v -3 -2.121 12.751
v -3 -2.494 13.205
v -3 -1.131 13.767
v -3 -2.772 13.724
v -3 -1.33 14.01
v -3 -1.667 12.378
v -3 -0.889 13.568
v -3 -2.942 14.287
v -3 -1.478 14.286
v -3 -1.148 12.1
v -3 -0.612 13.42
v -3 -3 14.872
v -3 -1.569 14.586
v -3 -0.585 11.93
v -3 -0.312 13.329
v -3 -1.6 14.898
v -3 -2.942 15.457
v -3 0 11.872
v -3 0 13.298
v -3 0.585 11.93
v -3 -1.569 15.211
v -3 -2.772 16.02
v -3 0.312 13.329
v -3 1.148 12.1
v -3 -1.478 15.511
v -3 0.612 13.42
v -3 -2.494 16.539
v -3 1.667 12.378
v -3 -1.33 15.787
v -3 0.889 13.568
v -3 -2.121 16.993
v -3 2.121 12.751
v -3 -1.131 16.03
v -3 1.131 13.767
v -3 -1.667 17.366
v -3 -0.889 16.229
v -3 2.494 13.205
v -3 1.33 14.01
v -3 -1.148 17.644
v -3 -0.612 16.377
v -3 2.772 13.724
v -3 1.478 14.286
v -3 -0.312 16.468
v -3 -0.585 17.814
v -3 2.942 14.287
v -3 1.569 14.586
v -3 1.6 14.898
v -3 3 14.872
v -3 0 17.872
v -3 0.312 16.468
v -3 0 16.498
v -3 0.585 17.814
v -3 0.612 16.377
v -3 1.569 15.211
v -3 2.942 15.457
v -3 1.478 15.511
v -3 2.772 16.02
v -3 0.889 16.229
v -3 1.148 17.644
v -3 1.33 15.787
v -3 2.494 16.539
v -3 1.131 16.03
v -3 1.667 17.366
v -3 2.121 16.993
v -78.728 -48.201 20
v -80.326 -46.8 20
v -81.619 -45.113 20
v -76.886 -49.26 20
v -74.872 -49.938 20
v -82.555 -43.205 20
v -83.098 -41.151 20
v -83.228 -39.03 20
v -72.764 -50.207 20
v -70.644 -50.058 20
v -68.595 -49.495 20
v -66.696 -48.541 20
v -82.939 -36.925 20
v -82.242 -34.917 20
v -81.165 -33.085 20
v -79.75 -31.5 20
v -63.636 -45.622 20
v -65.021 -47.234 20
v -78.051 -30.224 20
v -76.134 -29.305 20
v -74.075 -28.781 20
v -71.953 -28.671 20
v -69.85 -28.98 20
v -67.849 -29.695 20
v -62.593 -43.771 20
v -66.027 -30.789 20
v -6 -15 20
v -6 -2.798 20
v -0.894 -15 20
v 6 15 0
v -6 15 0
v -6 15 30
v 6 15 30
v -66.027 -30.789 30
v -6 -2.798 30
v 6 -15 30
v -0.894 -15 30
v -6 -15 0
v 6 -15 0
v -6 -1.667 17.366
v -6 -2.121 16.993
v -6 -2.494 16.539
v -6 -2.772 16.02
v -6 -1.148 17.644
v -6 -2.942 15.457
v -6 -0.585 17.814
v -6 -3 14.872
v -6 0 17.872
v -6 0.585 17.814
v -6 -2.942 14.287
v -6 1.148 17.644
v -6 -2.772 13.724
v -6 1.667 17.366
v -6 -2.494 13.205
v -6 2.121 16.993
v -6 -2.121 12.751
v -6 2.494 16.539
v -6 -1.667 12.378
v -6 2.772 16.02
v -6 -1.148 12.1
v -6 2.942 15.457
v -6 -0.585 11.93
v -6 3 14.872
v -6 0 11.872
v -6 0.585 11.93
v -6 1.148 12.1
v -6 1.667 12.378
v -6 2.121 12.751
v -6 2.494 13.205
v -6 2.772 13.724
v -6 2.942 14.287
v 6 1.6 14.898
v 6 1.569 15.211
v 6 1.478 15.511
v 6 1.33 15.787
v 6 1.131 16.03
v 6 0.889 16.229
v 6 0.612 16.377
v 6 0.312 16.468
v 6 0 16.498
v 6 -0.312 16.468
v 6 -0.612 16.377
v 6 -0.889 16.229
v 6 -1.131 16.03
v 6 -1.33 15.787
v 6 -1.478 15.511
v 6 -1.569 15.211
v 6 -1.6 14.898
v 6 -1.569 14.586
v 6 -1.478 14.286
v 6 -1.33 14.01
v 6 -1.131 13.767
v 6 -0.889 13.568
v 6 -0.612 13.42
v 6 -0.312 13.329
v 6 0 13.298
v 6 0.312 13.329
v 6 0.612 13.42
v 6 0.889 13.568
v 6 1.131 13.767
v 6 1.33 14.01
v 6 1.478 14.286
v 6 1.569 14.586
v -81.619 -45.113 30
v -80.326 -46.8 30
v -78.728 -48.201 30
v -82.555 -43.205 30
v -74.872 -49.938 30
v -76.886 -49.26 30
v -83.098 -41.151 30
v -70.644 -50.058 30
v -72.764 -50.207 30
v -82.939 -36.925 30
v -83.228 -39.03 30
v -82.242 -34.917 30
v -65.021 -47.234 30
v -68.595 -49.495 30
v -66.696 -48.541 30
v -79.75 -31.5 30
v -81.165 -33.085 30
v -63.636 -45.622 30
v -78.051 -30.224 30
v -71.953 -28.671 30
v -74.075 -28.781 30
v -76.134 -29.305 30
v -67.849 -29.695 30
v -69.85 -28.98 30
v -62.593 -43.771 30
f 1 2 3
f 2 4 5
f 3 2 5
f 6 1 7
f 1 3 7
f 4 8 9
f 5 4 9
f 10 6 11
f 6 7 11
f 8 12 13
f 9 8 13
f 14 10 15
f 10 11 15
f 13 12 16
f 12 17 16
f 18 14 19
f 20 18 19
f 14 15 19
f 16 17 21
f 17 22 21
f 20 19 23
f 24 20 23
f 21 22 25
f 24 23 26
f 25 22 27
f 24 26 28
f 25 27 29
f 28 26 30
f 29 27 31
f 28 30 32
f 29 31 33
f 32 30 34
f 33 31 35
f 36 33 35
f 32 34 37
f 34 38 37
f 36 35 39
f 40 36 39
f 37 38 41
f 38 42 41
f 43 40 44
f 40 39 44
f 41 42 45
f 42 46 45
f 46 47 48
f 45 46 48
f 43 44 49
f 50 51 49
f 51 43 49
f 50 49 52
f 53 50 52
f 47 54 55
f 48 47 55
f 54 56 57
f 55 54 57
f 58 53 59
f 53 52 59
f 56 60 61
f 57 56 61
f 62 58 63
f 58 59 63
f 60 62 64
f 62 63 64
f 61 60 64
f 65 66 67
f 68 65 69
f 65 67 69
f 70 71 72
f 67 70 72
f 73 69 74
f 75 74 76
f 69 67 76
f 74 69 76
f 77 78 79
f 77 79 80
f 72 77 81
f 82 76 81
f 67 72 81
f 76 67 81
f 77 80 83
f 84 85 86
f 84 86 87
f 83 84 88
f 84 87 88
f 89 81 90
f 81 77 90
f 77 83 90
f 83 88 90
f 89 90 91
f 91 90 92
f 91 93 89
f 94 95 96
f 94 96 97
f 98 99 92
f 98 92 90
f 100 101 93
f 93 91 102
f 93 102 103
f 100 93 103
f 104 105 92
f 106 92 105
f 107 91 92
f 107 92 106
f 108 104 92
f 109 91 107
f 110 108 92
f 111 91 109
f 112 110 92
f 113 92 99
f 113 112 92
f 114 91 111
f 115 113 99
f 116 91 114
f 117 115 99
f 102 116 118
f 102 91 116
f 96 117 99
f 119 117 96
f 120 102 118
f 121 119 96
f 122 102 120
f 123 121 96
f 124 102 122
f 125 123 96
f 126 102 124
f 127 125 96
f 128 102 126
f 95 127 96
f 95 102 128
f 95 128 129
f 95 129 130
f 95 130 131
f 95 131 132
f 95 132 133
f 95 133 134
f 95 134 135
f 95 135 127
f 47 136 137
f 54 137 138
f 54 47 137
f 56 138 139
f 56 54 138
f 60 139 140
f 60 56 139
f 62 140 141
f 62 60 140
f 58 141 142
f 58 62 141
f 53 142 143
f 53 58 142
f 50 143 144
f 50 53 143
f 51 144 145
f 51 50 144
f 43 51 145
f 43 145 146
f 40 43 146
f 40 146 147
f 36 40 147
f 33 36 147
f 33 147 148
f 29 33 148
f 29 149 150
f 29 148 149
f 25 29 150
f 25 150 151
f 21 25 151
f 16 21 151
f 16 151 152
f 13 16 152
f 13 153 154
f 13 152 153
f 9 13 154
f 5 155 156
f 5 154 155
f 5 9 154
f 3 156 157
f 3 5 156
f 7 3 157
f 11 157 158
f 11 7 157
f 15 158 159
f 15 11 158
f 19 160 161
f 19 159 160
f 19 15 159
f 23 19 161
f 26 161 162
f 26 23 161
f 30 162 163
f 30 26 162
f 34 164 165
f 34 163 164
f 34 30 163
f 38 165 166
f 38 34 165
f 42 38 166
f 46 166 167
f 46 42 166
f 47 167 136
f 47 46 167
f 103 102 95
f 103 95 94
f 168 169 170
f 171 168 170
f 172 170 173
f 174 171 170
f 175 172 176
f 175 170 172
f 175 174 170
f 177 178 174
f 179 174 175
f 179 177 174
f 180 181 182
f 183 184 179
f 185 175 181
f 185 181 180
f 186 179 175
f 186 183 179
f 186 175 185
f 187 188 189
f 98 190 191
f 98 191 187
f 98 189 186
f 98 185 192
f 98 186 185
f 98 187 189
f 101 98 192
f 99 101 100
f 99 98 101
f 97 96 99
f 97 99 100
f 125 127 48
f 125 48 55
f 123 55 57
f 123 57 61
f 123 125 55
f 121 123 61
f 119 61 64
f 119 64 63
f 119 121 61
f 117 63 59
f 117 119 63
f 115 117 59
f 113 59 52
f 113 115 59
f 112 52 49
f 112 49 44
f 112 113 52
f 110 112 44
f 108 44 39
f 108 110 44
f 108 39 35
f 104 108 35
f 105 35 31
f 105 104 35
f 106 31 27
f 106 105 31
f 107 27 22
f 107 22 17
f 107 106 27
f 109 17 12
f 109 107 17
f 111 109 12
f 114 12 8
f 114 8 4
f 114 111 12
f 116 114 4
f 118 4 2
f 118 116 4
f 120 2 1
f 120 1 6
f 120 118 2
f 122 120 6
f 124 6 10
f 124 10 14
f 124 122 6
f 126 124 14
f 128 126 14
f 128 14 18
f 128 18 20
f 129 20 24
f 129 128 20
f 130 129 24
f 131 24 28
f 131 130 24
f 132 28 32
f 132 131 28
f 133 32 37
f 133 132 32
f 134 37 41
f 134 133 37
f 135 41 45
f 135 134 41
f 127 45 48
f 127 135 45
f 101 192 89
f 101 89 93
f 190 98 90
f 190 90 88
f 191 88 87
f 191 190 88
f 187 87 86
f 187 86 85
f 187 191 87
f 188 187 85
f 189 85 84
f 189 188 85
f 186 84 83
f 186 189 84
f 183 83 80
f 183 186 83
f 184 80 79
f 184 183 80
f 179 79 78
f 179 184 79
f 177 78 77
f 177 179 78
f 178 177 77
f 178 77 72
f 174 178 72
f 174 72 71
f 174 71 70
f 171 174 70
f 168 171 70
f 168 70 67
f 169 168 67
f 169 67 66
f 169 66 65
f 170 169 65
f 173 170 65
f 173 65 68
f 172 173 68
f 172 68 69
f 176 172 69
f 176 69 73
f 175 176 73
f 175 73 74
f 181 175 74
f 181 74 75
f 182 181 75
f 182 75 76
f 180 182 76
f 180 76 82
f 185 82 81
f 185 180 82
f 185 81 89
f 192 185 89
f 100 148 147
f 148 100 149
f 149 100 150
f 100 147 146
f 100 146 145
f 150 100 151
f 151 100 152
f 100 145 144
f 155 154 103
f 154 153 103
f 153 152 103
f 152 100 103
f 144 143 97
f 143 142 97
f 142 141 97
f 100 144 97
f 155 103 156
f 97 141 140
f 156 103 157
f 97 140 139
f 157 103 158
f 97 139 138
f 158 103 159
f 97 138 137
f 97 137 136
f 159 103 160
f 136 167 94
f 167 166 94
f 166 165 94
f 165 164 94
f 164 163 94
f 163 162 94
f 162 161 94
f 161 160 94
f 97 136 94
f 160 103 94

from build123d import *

# Parameters (mm, degrees)
SKETCH_W        = 12
SKETCH_H        = 30
PAD_DEPTH       = 30
PAD001_DEPTH    = 10
SKETCH002_R     = 10.776267
PAD002_DEPTH    = 10
SKETCH004_R     = 3
POCKET001_DEPTH = 3
SKETCH005_R     = 1.6
POCKET_DEPTH    = 9.001


with BuildPart() as part:
    # Sketch → Pad (new body)
    with BuildSketch(Plane.XY):
        Rectangle(SKETCH_W, SKETCH_H)
    extrude(amount=PAD_DEPTH)

    # Sketch001 → Pad001 (join)
    with BuildSketch(Plane.XY.offset(30)):
        Polygon((0, 0), (-73.854295, -34.438823), (-73.854295, -49.021726), (0, -14.582903), align=None)
    extrude(amount=-PAD001_DEPTH)

    # Sketch002 → Pad002 (join)
    with BuildSketch(Plane.XY.offset(30)):
        with Locations((-72.459145, -39.435551)):
            Circle(SKETCH002_R)
    extrude(amount=-PAD002_DEPTH)

    # Sketch004 → Pocket001 (cut)
    with BuildSketch(Plane.YZ.offset(-6)):
        with Locations((0, 14.871989)):
            Circle(SKETCH004_R)
    extrude(amount=POCKET001_DEPTH, mode=Mode.SUBTRACT)

    # Sketch005 → Pocket (cut, through all)
    with BuildSketch(Plane.YZ.offset(-3)):
        with Locations((0, 14.898449)):
            Circle(SKETCH005_R)
    extrude(amount=POCKET_DEPTH, mode=Mode.SUBTRACT)


solid = part.part
